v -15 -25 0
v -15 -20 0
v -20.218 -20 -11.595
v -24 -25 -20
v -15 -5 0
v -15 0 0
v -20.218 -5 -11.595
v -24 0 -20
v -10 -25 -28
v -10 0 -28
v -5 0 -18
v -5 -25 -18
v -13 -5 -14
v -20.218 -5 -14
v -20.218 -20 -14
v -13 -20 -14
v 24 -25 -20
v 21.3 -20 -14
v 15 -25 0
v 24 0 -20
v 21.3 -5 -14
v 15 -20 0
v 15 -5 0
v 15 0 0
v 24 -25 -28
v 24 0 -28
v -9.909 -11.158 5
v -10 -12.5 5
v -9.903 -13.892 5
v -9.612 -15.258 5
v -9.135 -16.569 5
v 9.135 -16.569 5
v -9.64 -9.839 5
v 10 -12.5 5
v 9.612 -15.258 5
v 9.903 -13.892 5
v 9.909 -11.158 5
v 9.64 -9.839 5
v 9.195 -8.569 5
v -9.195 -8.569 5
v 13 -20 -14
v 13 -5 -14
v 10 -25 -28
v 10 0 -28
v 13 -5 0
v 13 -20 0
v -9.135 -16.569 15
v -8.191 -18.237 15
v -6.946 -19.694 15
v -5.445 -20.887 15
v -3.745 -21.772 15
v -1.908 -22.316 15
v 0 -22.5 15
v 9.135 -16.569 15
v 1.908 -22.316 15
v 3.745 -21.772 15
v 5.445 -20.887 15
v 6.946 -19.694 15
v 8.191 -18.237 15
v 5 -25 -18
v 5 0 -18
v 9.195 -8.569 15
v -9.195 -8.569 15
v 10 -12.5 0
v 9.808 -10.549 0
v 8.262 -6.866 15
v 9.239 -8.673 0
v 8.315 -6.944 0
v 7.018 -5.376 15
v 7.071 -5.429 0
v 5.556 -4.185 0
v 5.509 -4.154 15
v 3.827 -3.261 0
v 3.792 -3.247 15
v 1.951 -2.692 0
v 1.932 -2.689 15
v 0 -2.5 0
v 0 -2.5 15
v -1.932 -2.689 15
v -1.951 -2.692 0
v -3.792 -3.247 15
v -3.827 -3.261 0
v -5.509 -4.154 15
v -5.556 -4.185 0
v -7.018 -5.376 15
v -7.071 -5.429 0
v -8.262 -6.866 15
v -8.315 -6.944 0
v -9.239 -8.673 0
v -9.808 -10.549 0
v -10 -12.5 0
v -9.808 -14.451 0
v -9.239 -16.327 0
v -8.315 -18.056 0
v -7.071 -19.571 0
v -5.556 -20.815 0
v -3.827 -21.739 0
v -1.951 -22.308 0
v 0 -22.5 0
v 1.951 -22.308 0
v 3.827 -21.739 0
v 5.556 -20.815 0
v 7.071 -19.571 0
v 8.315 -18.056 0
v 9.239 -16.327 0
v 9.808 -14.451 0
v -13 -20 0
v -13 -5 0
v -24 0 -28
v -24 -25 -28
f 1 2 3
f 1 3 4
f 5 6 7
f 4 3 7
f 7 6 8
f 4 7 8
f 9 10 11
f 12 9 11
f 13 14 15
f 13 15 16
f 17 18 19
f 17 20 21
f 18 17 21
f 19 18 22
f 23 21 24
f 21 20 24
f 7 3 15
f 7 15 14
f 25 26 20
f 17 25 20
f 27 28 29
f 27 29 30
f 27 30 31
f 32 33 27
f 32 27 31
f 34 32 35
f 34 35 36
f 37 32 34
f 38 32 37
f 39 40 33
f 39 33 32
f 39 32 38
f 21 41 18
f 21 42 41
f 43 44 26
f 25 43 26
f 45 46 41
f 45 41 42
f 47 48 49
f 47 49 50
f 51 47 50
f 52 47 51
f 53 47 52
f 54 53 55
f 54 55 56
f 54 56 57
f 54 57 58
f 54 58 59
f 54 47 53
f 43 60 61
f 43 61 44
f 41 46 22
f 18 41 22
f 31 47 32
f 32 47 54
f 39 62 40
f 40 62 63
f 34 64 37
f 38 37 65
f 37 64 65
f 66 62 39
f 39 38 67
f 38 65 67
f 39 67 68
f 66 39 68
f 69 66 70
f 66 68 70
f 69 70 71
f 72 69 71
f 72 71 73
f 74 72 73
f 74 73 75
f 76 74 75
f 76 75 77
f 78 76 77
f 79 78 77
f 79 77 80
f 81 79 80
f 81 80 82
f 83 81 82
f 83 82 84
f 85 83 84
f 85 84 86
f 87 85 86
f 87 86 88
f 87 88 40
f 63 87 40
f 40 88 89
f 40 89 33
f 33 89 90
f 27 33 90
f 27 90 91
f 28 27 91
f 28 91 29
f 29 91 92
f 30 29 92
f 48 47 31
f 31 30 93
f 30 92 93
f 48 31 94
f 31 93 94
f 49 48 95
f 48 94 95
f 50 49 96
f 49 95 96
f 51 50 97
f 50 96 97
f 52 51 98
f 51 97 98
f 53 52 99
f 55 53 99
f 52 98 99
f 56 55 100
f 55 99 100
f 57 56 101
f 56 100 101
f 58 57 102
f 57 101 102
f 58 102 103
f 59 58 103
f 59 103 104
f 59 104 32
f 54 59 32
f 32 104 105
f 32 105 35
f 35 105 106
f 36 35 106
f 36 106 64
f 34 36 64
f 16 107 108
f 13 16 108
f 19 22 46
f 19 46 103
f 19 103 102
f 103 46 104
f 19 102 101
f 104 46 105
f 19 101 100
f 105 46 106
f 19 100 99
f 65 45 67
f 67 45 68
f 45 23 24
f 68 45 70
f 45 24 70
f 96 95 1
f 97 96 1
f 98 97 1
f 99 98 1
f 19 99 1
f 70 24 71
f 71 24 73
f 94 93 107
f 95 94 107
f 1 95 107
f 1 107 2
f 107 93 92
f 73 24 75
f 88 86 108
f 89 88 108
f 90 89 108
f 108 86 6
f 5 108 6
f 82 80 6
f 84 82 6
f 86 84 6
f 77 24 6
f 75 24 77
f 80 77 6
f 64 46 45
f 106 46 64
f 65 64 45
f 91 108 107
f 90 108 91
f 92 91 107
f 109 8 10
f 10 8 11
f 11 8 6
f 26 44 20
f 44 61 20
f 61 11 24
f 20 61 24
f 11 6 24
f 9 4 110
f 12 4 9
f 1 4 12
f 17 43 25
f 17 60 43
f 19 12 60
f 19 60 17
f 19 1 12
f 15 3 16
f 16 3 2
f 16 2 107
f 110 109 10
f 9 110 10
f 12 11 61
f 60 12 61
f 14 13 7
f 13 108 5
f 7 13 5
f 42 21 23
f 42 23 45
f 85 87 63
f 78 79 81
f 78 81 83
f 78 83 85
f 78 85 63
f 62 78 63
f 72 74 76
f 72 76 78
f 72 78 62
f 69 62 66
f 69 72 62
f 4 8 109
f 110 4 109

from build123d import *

# Parameters (mm, degrees)
F1_DEPTH  = 25
F3_W      = 2
F3_H      = 15
F3_W_2    = 5.2175602431
F4_DEPTH  = 14
F5_W      = 6.9340183245
F5_H      = 15
F5_W_2    = 2
F6_DEPTH  = 14
F7_R      = 10
F8_DEPTH  = 15
F10_DEPTH = 10


with BuildPart() as f1:
    # F0 (on Front) → F1 (new body)
    with BuildSketch(Plane.XZ):
        Polygon((10, -28), (24, -28), (24, -20), (15, 0), (-15, 0), (-24, -20), (-24, -28), (-10, -28), (-5, -18), (5, -18), align=None)
    extrude(amount=F1_DEPTH)

    # F3 (on face) → F4 (cut)
    with BuildSketch(Plane.XY):
        with Locations((-14, -12.5)):
            Rectangle(F3_W, F3_H)
        with Locations((-17.6087801216, -12.5)):
            Rectangle(F3_W_2, F3_H)
    extrude(amount=-F4_DEPTH, mode=Mode.SUBTRACT)

    # F5 (on face) → F6 (cut)
    with BuildSketch(Plane.XY):
        with Locations((18.4670091623, -12.5)):
            Rectangle(F5_W, F5_H)
        with Locations((14, -12.5)):
            Rectangle(F5_W_2, F5_H)
    extrude(amount=-F6_DEPTH, mode=Mode.SUBTRACT)

    # F7 (on face) → F8 (join)
    with BuildSketch(Plane.XY):
        with Locations((0, -12.5)):
            Circle(F7_R)
    extrude(amount=F8_DEPTH)

    # F9 (on face) → F10 (cut)
    with BuildSketch(Plane.XY.offset(15)):
        with BuildLine():
            Line((9.1950891808, -8.5693085904), (-9.1950891808, -8.5693085904))
            ThreePointArc((-9.1950891808, -8.5693085904), (-9.79670587, -10.4938708676), (-10, -12.5))
            ThreePointArc((-10, -12.5), (-9.7812549358, -14.5801566962), (-9.1345896238, -16.5693085904))
            Line((-9.1345896238, -16.5693085904), (9.1345896238, -16.5693085904))
            ThreePointArc((9.1345896238, -16.5693085904), (9.7812549358, -14.5801566962), (10, -12.5))
            ThreePointArc((10, -12.5), (9.79670587, -10.4938708676), (9.1950891808, -8.5693085904))
        make_face()
        with BuildLine():
            Line((10, -8.5693085904), (9.1950891808, -8.5693085904))
            ThreePointArc((9.1950891808, -8.5693085904), (9.79670587, -10.4938708676), (10, -12.5))
            Line((10, -12.5), (10, -8.5693085904))
        make_face()
    extrude(amount=-F10_DEPTH, mode=Mode.SUBTRACT)


solid = f1.part
